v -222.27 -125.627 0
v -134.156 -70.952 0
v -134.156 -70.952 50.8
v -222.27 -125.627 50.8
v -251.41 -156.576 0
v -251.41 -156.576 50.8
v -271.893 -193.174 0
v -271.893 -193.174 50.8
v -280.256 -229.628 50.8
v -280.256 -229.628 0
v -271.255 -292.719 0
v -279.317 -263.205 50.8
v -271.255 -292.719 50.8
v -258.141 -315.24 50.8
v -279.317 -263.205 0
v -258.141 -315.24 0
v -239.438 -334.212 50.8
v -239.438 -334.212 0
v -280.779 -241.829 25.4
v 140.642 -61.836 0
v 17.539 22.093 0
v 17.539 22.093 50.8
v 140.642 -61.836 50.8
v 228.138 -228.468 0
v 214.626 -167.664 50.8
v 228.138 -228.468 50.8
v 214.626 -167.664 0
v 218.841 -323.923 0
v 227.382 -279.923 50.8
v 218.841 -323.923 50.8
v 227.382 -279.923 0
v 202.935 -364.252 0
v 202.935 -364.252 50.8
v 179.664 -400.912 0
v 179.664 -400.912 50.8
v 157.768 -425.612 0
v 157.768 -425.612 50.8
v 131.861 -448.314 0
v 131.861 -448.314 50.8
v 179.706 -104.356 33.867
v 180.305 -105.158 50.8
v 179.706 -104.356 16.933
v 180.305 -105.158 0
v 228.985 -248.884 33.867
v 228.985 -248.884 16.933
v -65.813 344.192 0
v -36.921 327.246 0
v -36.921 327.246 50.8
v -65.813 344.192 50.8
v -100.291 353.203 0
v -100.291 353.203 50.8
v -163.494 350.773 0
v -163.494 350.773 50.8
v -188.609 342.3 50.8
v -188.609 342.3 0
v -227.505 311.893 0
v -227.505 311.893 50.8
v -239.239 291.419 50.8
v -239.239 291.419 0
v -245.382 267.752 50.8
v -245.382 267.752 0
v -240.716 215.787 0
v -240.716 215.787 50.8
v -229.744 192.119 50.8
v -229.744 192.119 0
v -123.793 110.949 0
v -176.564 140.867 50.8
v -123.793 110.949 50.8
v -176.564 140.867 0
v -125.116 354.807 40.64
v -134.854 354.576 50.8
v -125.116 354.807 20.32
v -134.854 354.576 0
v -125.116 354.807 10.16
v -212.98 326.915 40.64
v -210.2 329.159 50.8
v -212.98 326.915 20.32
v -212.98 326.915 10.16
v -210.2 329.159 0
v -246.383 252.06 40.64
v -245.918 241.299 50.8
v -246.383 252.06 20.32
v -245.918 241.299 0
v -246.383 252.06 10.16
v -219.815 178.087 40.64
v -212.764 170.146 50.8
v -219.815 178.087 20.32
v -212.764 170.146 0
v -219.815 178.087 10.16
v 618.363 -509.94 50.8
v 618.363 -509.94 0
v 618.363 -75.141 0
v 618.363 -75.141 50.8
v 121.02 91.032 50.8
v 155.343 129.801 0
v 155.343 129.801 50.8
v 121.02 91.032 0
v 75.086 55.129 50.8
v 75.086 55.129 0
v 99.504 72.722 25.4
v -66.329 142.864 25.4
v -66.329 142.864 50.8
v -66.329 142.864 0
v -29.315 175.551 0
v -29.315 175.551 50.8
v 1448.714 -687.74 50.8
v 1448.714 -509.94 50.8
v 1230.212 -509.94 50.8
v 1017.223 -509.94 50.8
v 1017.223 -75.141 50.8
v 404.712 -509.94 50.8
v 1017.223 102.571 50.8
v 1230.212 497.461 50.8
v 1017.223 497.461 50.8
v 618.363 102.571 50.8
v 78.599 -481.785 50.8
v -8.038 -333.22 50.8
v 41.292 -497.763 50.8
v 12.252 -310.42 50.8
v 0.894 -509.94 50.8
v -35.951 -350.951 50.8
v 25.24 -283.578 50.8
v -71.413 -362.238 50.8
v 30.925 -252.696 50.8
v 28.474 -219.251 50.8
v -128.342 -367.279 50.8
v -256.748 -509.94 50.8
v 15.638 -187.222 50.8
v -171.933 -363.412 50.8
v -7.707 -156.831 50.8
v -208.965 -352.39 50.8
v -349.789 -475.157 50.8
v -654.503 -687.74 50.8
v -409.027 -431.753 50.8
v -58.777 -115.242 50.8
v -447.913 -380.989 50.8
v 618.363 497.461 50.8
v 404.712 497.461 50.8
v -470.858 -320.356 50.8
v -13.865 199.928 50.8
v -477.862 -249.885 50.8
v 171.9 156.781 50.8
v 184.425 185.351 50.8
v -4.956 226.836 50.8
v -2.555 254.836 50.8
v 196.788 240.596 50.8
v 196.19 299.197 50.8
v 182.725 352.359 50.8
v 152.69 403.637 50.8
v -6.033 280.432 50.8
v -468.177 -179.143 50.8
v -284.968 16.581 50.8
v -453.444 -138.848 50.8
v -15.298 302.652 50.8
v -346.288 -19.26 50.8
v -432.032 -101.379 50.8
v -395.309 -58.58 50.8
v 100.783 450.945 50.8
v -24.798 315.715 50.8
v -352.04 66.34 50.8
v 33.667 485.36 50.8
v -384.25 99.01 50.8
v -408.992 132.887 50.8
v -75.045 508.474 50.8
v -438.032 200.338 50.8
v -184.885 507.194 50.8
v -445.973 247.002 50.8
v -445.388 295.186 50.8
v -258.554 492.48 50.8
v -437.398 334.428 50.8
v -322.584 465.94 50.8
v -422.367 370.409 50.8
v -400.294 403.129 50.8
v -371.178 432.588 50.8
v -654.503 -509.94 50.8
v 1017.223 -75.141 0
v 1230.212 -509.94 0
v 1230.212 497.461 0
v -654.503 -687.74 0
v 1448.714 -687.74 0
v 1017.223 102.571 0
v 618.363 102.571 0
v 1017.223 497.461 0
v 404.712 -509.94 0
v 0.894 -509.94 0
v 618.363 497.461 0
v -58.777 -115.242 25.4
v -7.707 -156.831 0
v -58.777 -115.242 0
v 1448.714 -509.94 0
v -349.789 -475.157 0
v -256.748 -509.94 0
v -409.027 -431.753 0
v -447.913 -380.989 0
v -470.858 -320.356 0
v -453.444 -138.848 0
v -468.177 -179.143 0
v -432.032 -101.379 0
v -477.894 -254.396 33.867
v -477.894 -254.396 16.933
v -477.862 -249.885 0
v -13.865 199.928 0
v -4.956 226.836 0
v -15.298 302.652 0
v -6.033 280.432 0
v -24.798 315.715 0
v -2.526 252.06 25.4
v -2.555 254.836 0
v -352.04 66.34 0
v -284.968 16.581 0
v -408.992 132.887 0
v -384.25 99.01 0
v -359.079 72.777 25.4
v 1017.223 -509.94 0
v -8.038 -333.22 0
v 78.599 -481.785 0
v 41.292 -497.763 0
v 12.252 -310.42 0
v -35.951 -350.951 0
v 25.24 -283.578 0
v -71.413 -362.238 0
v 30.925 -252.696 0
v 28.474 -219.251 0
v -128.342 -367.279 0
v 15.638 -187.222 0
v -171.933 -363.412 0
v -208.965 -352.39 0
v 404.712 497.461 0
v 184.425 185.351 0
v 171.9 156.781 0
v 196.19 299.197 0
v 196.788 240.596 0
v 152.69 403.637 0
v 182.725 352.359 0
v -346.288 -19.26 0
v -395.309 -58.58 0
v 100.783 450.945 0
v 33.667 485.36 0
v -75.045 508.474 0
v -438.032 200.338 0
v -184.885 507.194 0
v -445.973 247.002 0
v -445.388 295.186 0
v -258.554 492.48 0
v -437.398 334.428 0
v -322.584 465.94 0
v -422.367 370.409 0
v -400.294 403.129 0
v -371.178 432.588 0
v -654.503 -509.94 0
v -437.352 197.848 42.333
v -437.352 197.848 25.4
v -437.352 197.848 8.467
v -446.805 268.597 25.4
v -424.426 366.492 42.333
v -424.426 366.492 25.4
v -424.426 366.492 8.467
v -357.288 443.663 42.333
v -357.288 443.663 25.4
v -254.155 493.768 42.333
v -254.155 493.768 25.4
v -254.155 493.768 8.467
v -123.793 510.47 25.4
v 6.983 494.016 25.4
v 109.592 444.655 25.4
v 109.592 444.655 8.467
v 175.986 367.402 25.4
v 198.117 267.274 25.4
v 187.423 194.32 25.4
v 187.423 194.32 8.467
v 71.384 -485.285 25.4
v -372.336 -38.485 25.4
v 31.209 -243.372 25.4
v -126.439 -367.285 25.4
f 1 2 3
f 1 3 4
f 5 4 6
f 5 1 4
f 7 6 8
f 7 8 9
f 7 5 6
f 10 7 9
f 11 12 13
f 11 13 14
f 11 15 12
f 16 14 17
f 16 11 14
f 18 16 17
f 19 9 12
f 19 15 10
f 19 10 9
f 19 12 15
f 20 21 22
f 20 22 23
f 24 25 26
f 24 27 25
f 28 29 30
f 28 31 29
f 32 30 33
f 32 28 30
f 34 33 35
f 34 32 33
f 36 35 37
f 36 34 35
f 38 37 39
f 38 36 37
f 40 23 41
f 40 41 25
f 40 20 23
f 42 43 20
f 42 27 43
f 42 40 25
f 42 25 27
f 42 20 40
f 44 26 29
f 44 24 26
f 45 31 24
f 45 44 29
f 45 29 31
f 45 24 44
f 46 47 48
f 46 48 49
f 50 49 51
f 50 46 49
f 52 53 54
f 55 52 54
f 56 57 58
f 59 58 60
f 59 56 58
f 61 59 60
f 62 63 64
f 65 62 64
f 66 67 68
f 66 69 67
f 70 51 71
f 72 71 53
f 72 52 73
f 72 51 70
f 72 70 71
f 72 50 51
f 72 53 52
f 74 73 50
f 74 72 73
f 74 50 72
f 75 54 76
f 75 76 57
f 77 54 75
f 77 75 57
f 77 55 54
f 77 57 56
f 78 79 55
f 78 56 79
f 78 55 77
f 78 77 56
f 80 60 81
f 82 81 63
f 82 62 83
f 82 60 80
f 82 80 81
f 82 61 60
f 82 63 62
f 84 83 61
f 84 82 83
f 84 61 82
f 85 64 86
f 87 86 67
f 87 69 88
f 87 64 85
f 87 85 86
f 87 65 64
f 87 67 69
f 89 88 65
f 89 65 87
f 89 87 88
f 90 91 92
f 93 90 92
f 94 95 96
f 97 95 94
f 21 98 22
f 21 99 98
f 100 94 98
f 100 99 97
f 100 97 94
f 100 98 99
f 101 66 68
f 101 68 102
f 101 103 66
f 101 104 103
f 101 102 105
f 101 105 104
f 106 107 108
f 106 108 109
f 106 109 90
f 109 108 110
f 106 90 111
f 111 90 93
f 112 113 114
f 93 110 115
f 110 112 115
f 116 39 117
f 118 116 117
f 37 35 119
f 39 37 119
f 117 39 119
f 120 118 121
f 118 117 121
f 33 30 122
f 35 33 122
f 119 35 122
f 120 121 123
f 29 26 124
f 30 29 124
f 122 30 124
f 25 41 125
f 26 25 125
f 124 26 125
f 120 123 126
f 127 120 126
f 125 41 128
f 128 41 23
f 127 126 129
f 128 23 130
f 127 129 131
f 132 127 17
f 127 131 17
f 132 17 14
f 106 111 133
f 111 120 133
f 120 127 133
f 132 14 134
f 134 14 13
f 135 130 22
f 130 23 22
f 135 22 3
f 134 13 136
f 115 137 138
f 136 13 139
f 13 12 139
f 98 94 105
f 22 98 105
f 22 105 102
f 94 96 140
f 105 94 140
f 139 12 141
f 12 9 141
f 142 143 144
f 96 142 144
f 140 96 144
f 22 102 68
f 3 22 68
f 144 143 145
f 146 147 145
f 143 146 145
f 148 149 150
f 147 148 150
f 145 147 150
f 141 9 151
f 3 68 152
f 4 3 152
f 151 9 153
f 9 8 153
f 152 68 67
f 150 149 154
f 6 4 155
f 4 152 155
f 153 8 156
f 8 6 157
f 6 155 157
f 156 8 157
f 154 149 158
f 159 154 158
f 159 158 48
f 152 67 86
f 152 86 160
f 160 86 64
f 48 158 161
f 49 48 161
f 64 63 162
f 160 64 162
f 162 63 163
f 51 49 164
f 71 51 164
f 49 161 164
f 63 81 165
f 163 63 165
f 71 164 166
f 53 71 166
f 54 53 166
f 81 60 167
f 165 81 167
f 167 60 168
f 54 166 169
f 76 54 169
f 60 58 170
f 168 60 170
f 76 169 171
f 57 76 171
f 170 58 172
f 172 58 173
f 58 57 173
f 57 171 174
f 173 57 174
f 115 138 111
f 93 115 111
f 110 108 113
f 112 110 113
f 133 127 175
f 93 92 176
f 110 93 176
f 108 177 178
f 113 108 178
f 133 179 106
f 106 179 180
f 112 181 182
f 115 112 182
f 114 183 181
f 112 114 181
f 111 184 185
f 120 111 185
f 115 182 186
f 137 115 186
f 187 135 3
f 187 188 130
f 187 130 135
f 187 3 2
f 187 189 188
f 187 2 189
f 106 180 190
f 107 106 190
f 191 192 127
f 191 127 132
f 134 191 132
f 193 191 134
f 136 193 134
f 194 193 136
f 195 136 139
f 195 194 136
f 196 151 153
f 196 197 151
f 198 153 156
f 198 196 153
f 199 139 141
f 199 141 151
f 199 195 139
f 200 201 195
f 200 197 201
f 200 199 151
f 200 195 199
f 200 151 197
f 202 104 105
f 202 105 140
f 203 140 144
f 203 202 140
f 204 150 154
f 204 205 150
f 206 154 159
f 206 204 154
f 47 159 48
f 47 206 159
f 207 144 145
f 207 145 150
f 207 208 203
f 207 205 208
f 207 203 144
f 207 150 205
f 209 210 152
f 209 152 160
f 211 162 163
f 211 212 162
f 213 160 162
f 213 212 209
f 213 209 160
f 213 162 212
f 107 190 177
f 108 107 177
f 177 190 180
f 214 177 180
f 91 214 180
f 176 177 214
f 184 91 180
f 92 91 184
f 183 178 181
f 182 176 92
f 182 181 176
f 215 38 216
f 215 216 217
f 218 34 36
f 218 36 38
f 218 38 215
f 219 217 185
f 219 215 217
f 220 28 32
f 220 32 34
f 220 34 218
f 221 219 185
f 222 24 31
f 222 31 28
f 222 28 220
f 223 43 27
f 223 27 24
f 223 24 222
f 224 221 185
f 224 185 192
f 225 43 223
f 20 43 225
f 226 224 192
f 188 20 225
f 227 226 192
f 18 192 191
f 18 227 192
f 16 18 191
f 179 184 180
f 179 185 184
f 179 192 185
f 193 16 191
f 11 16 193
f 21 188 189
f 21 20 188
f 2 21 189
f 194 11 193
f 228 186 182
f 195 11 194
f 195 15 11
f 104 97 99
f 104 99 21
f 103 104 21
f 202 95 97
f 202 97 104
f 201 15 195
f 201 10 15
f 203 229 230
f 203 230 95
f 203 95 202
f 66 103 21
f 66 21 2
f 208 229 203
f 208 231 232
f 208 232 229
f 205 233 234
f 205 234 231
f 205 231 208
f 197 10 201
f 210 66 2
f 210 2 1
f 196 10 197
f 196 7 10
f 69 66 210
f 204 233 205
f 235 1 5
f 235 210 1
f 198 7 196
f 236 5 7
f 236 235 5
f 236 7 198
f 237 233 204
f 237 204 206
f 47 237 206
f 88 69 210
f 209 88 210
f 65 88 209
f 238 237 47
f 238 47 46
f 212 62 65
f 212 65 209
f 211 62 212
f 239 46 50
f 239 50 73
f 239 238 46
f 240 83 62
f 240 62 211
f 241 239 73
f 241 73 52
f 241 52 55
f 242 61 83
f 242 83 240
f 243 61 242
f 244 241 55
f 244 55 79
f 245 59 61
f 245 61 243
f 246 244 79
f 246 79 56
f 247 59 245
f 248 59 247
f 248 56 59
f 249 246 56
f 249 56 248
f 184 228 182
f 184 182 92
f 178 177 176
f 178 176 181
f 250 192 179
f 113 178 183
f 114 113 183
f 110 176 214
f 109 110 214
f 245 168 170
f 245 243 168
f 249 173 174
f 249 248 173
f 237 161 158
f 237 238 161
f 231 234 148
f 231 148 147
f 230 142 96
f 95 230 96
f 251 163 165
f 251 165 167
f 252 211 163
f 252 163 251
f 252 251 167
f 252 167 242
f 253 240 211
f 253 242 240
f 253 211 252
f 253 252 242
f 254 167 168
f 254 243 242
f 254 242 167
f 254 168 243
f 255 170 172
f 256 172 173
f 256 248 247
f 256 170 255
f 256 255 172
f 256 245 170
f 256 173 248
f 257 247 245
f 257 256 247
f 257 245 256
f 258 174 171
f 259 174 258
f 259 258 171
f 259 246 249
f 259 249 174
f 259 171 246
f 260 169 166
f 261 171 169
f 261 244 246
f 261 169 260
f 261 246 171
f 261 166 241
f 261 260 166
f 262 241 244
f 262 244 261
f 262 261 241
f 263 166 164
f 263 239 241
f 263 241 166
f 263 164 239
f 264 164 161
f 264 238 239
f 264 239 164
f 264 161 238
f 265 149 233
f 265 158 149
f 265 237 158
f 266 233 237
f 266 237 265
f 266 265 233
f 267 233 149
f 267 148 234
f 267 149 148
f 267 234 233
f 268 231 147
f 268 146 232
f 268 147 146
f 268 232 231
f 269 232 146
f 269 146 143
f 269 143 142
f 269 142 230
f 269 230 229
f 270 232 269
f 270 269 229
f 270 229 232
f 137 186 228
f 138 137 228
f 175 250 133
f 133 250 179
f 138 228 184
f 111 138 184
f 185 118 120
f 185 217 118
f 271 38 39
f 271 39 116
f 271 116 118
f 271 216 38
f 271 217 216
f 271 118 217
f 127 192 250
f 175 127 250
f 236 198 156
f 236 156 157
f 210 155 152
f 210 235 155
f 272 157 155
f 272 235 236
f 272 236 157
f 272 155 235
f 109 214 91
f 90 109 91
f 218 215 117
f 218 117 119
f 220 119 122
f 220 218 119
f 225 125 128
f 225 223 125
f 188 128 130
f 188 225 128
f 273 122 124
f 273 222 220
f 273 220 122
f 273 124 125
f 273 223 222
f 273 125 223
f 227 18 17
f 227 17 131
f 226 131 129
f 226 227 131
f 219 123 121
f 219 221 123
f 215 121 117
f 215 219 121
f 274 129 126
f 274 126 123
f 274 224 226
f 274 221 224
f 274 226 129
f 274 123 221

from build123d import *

# Parameters (mm, degrees)
F1_DEPTH = 50.8


with BuildPart() as f1:
    # F0 (on Top) → F1 (new body)
    with BuildSketch(Plane.XY):
        with BuildLine():
            add(Edge.make_bspline(
                [(-256.7479731839, -509.9398493767), (-331.0947230301, -492.5735059696), (-383.5255294376, -453.4954049322)],
                knots=[0.4444009035, 0.4444009035, 0.4444009035, 1, 1, 1], degree=2))
            Line((-256.7479731839, -509.9398493767), (0.8936934563, -509.9398493767))
            add(Edge.make_bspline(
                [(131.8607552846, -448.3139813211), (76.3916231759, -491.4426481707), (0.8936934563, -509.9398493767)],
                knots=[0, 0, 0, 0.5711158597, 0.5711158597, 0.5711158597], degree=2))
            add(Edge.make_bspline(
                [(228.9848872291, -248.8842938211), (228.9848872291, -372.7974882656), (131.8607552846, -448.3139813211)],
                knots=[0, 0, 0, 1, 1, 1], degree=2))
            add(Edge.make_bspline(
                [(179.7062413957, -104.3556479878), (228.9848872291, -170.1707521545), (228.9848872291, -248.8842938211)],
                knots=[0, 0, 0, 1, 1, 1], degree=2))
            add(Edge.make_bspline(
                [(17.5387066735, 22.0931367344), (130.4275955624, -38.5405438211), (179.7062413957, -104.3556479878)],
                knots=[0, 0, 0, 1, 1, 1], degree=2))
            add(Edge.make_bspline(
                [(155.342526118, 129.8006020122), (112.5682205624, 69.4976506233), (17.5387066735, 22.0931367344)],
                knots=[0, 0, 0, 1, 1, 1], degree=2))
            add(Edge.make_bspline(
                [(198.1168316735, 267.27369229), (198.1168316735, 190.1035534011), (155.342526118, 129.8006020122)],
                knots=[0, 0, 0, 1, 1, 1], degree=2))
            add(Edge.make_bspline(
                [(109.5916580624, 444.6547686789), (198.1168316735, 378.8396645122), (198.1168316735, 267.27369229)],
                knots=[0, 0, 0, 1, 1, 1], degree=2))
            add(Edge.make_bspline(
                [(-123.7928905487, 510.4698728455), (21.0664844513, 510.4698728455), (109.5916580624, 444.6547686789)],
                knots=[0, 0, 0, 1, 1, 1], degree=2))
            add(Edge.make_bspline(
                [(-357.2876822154, 443.6625811789), (-267.7703211043, 510.4698728455), (-123.7928905487, 510.4698728455)],
                knots=[0, 0, 0, 1, 1, 1], degree=2))
            add(Edge.make_bspline(
                [(-446.8050433265, 268.5966089567), (-446.8050433265, 376.8552895122), (-357.2876822154, 443.6625811789)],
                knots=[0, 0, 0, 1, 1, 1], degree=2))
            add(Edge.make_bspline(
                [(-408.9916752709, 132.8874075678), (-446.8050433265, 194.9542478455), (-446.8050433265, 268.5966089567)],
                knots=[0, 0, 0, 1, 1, 1], degree=2))
            add(Edge.make_bspline(
                [(-284.9682377709, 16.5809839567), (-371.1783072154, 70.82056729), (-408.9916752709, 132.8874075678)],
                knots=[0, 0, 0, 1, 1, 1], degree=2))
            add(Edge.make_bspline(
                [(-432.032473882, -101.3790854878), (-386.1713627709, -34.5717938211), (-284.9682377709, 16.5809839567)],
                knots=[0, 0, 0, 1, 1, 1], degree=2))
            add(Edge.make_bspline(
                [(-477.8935849932, -254.3964465989), (-477.8935849932, -168.1863771545), (-432.032473882, -101.3790854878)],
                knots=[0, 0, 0, 1, 1, 1], degree=2))
            add(Edge.make_bspline(
                [(-383.5255294376, -453.4954049322), (-477.8935849932, -383.1603354878), (-477.8935849932, -254.3964465989)],
                knots=[0, 0, 0, 1, 1, 1], degree=2))
        make_face()
        with BuildLine():
            add(Edge.make_bspline(
                [(-280.7790016598, -241.8287382656), (-280.7790016598, -301.1395021545), (-239.4378558265, -334.2124188211)],
                knots=[0, 0, 0, 1, 1, 1], degree=2))
            add(Edge.make_bspline(
                [(-134.1557377709, -70.9520021545), (-280.7790016598, -138.6412382656), (-280.7790016598, -241.8287382656)],
                knots=[0, 0, 0, 1, 1, 1], degree=2))
            add(Edge.make_bspline(
                [(-7.7069530487, -156.8313424322), (-46.6227516598, -116.5926271545), (-134.1557377709, -70.9520021545)],
                knots=[0, 0, 0, 1, 1, 1], degree=2))
            add(Edge.make_bspline(
                [(31.2088455624, -243.3721410433), (31.2088455624, -197.07005771), (-7.7069530487, -156.8313424322)],
                knots=[0, 0, 0, 1, 1, 1], degree=2))
            add(Edge.make_bspline(
                [(-8.0376822154, -333.2202313211), (31.2088455624, -299.1551271545), (31.2088455624, -243.3721410433)],
                knots=[0, 0, 0, 1, 1, 1], degree=2))
            add(Edge.make_bspline(
                [(-126.438723882, -367.2853354878), (-47.2842099932, -367.2853354878), (-8.0376822154, -333.2202313211)],
                knots=[0, 0, 0, 1, 1, 1], degree=2))
            add(Edge.make_bspline(
                [(-239.4378558265, -334.2124188211), (-198.0967099932, -367.2853354878), (-126.438723882, -367.2853354878)],
                knots=[0, 0, 0, 1, 1, 1], degree=2))
        make_face(mode=Mode.SUBTRACT)
        with BuildLine():
            add(Edge.make_bspline(
                [(-125.1158072154, 354.8066784011), (-179.5758766598, 354.8066784011), (-212.9795224932, 326.9151853455)],
                knots=[0, 0, 0, 1, 1, 1], degree=2))
            add(Edge.make_bspline(
                [(-36.9213627709, 327.2459145122), (-71.3171961043, 354.8066784011), (-125.1158072154, 354.8066784011)],
                knots=[0, 0, 0, 1, 1, 1], degree=2))
            add(Edge.make_bspline(
                [(-2.5255294376, 252.0601506233), (-2.5255294376, 299.6851506233), (-36.9213627709, 327.2459145122)],
                knots=[0, 0, 0, 1, 1, 1], degree=2))
            add(Edge.make_bspline(
                [(-29.3145919376, 175.5514700678), (-2.5255294376, 208.6243867344), (-2.5255294376, 252.0601506233)],
                knots=[0, 0, 0, 1, 1, 1], degree=2))
            add(Edge.make_bspline(
                [(-123.7928905487, 110.9490395122), (-56.1036544376, 142.4785534011), (-29.3145919376, 175.5514700678)],
                knots=[0, 0, 0, 1, 1, 1], degree=2))
            add(Edge.make_bspline(
                [(-219.8145919376, 178.0870603455), (-193.2460155487, 145.3448728455), (-123.7928905487, 110.9490395122)],
                knots=[0, 0, 0, 1, 1, 1], degree=2))
            add(Edge.make_bspline(
                [(-246.3831683265, 252.0601506233), (-246.3831683265, 210.8292478455), (-219.8145919376, 178.0870603455)],
                knots=[0, 0, 0, 1, 1, 1], degree=2))
            add(Edge.make_bspline(
                [(-212.9795224932, 326.9151853455), (-246.3831683265, 299.02369229), (-246.3831683265, 252.0601506233)],
                knots=[0, 0, 0, 1, 1, 1], degree=2))
        make_face(mode=Mode.SUBTRACT)
        Polygon((1017.2227344513, -509.9398493767), (1230.2123177846, -509.9398493767), (1230.2123177846, 497.46119229), (1017.2227344513, 497.46119229), (1017.2227344513, 102.57056729), (618.3633594513, 102.57056729), (618.3633594513, 497.46119229), (404.7123177846, 497.46119229), (404.7123177846, -509.9398493767), (618.3633594513, -509.9398493767), (618.3633594513, -75.1412382656), (1017.2227344513, -75.1412382656), align=None)
        with BuildLine():
            Line((-654.5029599932, -509.9398493767), (-654.5029599932, -687.7398493767))
            Line((-654.5029599932, -687.7398493767), (1448.7140538957, -687.7398493767))
            Line((1448.7140538957, -687.7398493767), (1448.7140538957, -509.9398493767))
            Line((1448.7140538957, -509.9398493767), (1230.2123177846, -509.9398493767))
            Line((1230.2123177846, -509.9398493767), (1017.2227344513, -509.9398493767))
            Line((1017.2227344513, -509.9398493767), (618.3633594513, -509.9398493767))
            Line((618.3633594513, -509.9398493767), (404.7123177846, -509.9398493767))
            Line((404.7123177846, -509.9398493767), (0.8936934563, -509.9398493767))
            add(Edge.make_bspline(
                [(0.8936934563, -509.9398493767), (-55.8020962652, -523.8304743767), (-123.7928905487, -523.8304743767)],
                knots=[0.5711158597, 0.5711158597, 0.5711158597, 1, 1, 1], degree=2))
            add(Edge.make_bspline(
                [(-123.7928905487, -523.8304743767), (-197.2810607848, -523.8304743767), (-256.7479731839, -509.9398493767)],
                knots=[0, 0, 0, 0.4444009035, 0.4444009035, 0.4444009035], degree=2))
            Line((-256.7479731839, -509.9398493767), (-654.5029599932, -509.9398493767))
        make_face()
        with BuildLine():
            Line((0.8936934563, -509.9398493767), (-256.7479731839, -509.9398493767))
            add(Edge.make_bspline(
                [(-123.7928905487, -523.8304743767), (-197.2810607848, -523.8304743767), (-256.7479731839, -509.9398493767)],
                knots=[0, 0, 0, 0.4444009035, 0.4444009035, 0.4444009035], degree=2))
            add(Edge.make_bspline(
                [(0.8936934563, -509.9398493767), (-55.8020962652, -523.8304743767), (-123.7928905487, -523.8304743767)],
                knots=[0.5711158597, 0.5711158597, 0.5711158597, 1, 1, 1], degree=2))
        make_face()
    extrude(amount=F1_DEPTH)


solid = f1.part
